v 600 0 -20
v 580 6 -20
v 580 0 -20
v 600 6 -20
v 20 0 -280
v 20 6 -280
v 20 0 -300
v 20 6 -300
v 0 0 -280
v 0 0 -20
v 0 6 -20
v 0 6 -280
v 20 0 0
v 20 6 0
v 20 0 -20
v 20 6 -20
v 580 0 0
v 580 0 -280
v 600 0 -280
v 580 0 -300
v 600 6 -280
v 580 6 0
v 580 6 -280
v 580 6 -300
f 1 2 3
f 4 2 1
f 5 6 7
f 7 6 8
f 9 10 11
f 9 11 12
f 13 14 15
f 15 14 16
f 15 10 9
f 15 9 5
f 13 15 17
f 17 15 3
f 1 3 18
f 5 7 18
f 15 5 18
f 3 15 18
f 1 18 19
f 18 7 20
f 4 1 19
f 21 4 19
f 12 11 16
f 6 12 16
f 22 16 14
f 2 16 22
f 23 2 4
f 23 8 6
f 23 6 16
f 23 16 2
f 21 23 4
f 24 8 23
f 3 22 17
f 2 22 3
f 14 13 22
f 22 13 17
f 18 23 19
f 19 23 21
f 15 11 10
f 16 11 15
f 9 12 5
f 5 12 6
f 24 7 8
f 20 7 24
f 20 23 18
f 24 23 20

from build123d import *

# Parameters (mm, degrees)
SZKIC1_W                    = 600
SZKIC1_H                    = 300
DODANIE_WYCI_GNI_CIE1_DEPTH = 6
SZKIC2_W                    = 20
SZKIC2_H                    = 20
WYTNIJ_WYCI_GNI_CIE1_DEPTH  = 671.847225529


with BuildPart() as part:
    # Szkic1 → Dodanie-wyciągnięcie1 (new body)
    with BuildSketch(Plane(origin=(0, 0, 0), x_dir=(1, 0, 0), z_dir=(0, 1, 0))):
        with Locations((300, 150)):
            Rectangle(SZKIC1_W, SZKIC1_H)
    extrude(amount=DODANIE_WYCI_GNI_CIE1_DEPTH)

    # Szkic2 → Wytnij-wyciągnięcie1 (cut, through all)
    with BuildSketch(Plane(origin=(0, 6, 0), x_dir=(1, 0, 0), z_dir=(0, 1, 0))):
        with Locations((590, 10)):
            Rectangle(SZKIC2_W, SZKIC2_H)
        with Locations((10, 10)):
            Rectangle(SZKIC2_W, SZKIC2_H)
        with Locations((590, 290)):
            Rectangle(SZKIC2_W, SZKIC2_H)
        with Locations((10, 290)):
            Rectangle(SZKIC2_W, SZKIC2_H)
    extrude(amount=-WYTNIJ_WYCI_GNI_CIE1_DEPTH, mode=Mode.SUBTRACT)


solid = part.part
